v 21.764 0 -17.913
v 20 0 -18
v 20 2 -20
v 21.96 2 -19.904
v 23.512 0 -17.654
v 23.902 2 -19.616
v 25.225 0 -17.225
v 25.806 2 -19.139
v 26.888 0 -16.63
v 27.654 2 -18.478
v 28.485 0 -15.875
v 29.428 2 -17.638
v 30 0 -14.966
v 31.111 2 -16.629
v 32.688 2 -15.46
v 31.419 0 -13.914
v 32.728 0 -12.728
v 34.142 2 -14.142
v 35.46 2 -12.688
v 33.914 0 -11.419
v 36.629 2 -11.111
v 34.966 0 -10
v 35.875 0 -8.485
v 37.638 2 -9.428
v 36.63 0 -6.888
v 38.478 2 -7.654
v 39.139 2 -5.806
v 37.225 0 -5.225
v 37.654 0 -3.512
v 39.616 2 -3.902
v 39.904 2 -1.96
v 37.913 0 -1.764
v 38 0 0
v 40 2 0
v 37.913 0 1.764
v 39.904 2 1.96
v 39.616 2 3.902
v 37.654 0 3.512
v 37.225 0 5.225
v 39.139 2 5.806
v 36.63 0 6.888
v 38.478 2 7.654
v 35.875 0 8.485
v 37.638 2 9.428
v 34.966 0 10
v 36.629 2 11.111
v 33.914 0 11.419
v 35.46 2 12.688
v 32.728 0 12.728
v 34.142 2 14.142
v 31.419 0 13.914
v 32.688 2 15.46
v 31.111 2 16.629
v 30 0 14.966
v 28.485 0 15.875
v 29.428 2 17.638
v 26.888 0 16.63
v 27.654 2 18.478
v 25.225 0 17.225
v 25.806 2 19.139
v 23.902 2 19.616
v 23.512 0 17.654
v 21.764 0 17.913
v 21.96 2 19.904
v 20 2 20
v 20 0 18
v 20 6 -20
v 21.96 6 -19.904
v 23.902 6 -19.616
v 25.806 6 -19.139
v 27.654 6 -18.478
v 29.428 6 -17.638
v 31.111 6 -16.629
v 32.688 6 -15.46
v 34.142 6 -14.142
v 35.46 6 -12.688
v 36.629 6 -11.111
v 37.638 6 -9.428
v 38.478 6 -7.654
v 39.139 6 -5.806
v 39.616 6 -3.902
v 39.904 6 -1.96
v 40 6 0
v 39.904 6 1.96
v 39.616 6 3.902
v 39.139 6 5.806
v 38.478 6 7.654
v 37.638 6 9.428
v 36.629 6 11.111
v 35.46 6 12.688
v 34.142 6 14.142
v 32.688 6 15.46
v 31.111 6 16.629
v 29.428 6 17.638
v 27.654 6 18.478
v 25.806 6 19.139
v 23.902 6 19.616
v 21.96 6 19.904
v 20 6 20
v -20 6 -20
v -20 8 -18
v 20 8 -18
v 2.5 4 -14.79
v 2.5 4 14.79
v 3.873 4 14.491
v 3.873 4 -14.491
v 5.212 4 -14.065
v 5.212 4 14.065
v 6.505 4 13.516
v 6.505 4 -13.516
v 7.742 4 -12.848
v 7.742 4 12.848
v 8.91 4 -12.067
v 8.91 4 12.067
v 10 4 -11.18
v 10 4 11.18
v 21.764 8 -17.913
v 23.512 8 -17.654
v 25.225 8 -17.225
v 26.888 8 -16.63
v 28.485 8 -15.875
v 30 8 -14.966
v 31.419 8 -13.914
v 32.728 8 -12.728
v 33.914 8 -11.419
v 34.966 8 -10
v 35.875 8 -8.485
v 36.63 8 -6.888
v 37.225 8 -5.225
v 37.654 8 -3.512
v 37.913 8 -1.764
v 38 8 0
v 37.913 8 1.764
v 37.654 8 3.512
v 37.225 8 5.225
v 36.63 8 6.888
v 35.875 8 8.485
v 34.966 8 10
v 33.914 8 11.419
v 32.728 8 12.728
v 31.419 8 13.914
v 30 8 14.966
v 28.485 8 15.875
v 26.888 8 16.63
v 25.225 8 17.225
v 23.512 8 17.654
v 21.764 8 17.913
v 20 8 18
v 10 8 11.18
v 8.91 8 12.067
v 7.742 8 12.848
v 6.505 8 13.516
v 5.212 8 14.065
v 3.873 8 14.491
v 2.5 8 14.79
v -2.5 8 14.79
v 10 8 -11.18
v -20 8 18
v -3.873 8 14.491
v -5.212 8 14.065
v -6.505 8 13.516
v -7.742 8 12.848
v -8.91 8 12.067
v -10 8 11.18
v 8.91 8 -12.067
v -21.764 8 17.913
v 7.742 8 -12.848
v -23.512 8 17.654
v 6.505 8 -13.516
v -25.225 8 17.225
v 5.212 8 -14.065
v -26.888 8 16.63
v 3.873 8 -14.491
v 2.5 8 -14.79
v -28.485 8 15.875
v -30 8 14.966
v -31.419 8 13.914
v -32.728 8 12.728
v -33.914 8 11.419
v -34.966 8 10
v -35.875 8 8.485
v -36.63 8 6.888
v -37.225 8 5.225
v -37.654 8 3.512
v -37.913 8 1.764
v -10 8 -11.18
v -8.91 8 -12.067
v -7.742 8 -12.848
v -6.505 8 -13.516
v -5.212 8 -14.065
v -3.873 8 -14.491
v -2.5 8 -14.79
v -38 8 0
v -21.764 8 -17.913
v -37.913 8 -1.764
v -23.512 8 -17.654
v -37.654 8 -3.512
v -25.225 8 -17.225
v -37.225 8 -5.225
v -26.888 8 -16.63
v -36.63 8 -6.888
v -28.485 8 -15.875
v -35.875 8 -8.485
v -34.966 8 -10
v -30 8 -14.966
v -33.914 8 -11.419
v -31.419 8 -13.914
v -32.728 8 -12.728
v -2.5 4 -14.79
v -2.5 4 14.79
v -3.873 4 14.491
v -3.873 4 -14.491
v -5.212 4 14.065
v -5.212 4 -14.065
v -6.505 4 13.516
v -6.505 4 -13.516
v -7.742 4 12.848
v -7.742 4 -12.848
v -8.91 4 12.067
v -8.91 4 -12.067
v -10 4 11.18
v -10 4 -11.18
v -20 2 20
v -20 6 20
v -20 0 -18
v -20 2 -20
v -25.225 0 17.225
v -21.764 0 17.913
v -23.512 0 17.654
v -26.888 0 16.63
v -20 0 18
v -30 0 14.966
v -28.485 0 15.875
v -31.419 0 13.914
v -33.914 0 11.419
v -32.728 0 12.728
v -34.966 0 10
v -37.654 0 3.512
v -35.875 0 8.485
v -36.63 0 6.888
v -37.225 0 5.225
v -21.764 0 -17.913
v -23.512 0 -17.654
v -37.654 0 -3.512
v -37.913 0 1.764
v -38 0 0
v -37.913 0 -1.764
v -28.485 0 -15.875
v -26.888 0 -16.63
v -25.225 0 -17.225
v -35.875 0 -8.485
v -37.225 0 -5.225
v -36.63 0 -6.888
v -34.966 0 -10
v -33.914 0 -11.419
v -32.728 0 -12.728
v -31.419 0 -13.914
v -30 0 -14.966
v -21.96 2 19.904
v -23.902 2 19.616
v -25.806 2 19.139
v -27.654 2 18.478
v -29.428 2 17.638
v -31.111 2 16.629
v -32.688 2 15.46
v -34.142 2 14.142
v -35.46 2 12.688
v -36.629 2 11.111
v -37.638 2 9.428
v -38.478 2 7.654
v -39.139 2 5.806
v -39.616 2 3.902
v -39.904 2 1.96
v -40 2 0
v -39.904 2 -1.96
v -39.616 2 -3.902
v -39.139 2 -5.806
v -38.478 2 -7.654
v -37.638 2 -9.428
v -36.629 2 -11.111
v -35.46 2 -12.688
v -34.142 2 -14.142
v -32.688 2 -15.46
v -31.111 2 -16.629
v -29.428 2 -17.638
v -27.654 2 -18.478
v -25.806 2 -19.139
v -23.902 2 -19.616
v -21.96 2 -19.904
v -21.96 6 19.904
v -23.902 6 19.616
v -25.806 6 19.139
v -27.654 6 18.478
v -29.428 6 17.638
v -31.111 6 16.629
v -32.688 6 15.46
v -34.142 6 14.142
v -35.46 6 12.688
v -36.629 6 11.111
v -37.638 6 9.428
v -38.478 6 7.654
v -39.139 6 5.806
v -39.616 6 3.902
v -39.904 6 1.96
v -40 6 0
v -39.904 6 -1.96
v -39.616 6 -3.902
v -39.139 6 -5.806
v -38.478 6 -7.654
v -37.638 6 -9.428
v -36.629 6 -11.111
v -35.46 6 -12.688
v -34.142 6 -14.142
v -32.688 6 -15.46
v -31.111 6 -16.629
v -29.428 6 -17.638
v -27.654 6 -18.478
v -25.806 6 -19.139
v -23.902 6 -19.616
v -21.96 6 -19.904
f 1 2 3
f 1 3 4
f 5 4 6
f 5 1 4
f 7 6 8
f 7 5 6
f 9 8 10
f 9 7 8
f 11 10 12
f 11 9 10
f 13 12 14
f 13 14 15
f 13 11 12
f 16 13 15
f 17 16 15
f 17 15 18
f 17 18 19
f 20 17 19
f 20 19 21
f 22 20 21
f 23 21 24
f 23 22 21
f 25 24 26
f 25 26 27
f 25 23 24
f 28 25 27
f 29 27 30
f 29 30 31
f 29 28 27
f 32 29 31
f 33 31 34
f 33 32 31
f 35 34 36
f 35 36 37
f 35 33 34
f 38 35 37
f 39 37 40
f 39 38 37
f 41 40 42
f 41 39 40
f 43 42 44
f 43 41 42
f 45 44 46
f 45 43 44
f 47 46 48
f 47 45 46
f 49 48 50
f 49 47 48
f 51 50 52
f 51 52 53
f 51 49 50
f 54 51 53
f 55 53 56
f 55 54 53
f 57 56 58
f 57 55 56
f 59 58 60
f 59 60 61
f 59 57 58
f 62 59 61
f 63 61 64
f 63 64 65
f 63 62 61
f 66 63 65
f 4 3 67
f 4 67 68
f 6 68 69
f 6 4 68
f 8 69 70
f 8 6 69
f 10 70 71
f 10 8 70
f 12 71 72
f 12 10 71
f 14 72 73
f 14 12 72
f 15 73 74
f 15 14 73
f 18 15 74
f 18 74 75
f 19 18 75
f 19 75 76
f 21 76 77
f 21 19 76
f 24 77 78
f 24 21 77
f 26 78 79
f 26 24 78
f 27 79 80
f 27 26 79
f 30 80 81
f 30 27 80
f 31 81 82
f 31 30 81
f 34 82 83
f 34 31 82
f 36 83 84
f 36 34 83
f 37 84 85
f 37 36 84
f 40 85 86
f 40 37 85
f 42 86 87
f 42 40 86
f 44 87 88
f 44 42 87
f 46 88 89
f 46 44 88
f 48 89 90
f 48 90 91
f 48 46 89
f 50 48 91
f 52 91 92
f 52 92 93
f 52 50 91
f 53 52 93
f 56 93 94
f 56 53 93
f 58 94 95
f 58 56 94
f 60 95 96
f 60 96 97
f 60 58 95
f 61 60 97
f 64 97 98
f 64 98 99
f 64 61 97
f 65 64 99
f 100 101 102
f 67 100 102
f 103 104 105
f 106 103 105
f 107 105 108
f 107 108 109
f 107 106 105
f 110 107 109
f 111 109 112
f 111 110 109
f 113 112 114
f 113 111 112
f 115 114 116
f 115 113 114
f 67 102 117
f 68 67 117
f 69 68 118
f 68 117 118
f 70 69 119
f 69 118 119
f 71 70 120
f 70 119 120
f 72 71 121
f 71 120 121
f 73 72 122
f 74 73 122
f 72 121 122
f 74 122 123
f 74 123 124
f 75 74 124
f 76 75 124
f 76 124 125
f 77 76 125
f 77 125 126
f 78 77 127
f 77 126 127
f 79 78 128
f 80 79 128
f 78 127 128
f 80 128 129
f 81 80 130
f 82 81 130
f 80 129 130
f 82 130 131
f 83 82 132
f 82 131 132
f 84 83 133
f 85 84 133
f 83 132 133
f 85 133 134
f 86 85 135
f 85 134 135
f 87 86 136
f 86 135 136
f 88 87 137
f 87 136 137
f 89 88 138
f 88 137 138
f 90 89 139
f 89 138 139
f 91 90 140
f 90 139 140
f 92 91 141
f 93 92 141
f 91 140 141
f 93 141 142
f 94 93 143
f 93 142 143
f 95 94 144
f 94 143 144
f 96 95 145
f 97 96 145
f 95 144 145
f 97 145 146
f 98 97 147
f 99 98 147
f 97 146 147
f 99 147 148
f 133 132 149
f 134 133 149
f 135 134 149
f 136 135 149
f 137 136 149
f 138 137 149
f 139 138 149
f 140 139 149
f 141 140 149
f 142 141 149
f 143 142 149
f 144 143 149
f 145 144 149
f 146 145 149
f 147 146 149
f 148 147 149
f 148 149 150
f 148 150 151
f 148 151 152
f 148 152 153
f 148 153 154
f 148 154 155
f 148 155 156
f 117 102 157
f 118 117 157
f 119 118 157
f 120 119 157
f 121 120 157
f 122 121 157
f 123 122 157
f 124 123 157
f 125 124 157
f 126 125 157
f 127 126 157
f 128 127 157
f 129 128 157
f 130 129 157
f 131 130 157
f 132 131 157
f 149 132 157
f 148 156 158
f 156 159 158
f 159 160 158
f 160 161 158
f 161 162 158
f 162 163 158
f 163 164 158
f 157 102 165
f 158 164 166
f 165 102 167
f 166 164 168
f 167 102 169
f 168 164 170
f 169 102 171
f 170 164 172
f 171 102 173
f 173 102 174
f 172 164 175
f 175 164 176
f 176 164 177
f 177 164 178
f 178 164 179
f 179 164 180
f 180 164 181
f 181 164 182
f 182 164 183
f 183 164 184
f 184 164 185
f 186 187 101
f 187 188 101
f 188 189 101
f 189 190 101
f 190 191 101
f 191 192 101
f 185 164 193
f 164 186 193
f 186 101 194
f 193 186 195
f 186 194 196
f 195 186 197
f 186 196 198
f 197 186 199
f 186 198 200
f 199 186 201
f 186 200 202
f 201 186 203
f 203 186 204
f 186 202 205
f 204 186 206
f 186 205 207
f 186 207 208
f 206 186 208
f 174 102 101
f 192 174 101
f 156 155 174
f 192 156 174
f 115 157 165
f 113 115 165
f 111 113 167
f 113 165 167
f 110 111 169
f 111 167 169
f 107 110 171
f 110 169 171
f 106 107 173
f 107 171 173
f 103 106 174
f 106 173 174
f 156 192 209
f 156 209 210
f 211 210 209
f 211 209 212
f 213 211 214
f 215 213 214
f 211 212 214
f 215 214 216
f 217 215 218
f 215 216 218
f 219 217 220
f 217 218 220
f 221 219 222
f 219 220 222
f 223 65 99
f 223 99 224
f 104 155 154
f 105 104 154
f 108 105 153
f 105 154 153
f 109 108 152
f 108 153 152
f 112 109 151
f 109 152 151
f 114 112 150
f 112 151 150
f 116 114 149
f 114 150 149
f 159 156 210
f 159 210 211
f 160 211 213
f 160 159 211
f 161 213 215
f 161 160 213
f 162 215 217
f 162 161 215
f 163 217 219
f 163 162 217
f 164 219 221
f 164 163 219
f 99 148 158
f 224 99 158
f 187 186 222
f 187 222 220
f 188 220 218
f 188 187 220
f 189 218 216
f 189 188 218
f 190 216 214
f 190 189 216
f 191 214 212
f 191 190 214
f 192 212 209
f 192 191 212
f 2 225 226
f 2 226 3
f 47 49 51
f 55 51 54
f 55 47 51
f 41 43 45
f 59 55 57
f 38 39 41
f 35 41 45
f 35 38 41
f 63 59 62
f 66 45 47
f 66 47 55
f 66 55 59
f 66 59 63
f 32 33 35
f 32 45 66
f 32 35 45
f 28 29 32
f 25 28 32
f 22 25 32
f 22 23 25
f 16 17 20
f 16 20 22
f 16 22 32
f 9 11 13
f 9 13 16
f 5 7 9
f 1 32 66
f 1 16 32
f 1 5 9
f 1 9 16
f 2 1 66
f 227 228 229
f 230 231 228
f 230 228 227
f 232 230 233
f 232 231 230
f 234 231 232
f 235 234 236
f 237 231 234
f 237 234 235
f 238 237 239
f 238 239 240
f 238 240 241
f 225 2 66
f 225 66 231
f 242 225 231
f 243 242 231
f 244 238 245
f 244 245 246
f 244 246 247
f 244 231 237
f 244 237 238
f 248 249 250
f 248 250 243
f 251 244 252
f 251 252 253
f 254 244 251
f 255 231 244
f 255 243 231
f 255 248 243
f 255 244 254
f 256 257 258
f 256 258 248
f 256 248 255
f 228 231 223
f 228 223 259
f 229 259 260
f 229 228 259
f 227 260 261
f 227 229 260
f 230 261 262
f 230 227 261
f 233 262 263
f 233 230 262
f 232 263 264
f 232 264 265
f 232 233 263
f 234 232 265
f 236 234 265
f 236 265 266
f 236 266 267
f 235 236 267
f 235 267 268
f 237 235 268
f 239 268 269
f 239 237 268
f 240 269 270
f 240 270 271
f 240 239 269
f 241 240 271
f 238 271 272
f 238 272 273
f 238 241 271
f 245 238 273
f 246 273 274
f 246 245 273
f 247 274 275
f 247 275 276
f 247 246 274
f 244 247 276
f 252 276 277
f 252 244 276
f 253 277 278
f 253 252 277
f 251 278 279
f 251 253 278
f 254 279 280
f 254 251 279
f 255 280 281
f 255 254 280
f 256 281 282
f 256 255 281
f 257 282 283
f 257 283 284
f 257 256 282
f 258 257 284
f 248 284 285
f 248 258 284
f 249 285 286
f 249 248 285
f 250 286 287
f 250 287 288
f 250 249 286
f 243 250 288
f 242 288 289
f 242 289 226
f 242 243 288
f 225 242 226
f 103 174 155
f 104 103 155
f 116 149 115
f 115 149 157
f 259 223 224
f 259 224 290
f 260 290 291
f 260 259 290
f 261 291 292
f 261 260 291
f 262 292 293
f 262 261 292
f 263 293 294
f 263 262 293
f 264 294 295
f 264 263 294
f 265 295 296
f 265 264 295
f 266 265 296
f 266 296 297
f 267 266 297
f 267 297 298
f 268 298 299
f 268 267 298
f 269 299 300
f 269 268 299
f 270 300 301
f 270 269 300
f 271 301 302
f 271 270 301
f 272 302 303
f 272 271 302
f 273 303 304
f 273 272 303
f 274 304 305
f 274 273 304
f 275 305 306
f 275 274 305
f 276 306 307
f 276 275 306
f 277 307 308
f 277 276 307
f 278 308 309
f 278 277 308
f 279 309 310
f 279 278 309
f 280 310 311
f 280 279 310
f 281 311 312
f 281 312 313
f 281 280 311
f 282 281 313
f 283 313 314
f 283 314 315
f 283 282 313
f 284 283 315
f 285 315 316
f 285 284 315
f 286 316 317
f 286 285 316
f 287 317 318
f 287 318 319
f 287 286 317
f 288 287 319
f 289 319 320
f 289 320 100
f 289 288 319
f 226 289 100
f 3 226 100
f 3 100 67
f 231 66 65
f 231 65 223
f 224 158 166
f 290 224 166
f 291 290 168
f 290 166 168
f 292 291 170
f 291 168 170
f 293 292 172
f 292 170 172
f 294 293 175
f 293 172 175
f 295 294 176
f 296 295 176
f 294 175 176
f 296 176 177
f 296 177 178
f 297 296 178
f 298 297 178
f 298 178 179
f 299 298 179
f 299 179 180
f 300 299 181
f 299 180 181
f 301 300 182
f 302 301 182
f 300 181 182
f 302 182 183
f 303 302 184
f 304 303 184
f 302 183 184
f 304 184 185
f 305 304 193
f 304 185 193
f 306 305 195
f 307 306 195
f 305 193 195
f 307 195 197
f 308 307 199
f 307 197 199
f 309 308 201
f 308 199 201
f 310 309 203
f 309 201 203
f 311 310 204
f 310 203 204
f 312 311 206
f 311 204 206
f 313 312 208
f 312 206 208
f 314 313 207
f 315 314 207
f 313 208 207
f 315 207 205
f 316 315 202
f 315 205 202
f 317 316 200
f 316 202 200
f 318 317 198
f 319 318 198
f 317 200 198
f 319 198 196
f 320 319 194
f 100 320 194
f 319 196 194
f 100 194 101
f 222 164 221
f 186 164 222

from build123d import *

# Parameters (mm, degrees)
BOSS_EXTRUDE1_DEPTH = 8
CUT_EXTRUDE5_DEPTH  = 4
CHAMFER1_SIZE       = 2


with BuildPart() as part:
    # Sketch1 → Boss-Extrude1 (new body)
    with BuildSketch(Plane(origin=(0, 0, 0), x_dir=(1, 0, 0), z_dir=(0, 1, 0))):
        with BuildLine():
            Line((-20, 20), (20, 20))
            ThreePointArc((20, 20), (40, 0), (20, -20))
            Line((20, -20), (-20, -20))
            ThreePointArc((-20, -20), (-40, 0), (-20, 20))
        make_face()
    extrude(amount=BOSS_EXTRUDE1_DEPTH)

    # Sketch2 → Cut-Extrude5 (cut)
    with BuildSketch(Plane(origin=(0, 8, 0), x_dir=(1, 0, 0), z_dir=(0, 1, 0))):
        with BuildLine():
            Line((-10, -11.180339887), (-10, 11.180339887))
            ThreePointArc((-10, 11.180339887), (-6.505403256, 13.515906498), (-2.5, 14.790199458))
            Line((-2.5, 14.790199458), (-2.5, -14.790199458))
            ThreePointArc((-2.5, -14.790199458), (-6.505403256, -13.515906498), (-10, -11.180339887))
        make_face()
        with BuildLine():
            Line((10, -11.180339887), (10, 11.180339887))
            ThreePointArc((10, 11.180339887), (6.505403256, 13.515906498), (2.5, 14.790199458))
            Line((2.5, 14.790199458), (2.5, -14.790199458))
            ThreePointArc((2.5, -14.790199458), (6.505403256, -13.515906498), (10, -11.180339887))
        make_face()
    extrude(amount=-CUT_EXTRUDE5_DEPTH, mode=Mode.SUBTRACT)

    # Chamfer1
    chamfer1_edges = [part.edges().sort_by_distance(p)[0] for p in [
        (40, 8, 0),
        (0, 8, -20),
        (-40, 8, 0),
        (0, 0, -20),
        (40, 0, 0),
        (0, 0, 20),
        (-40, 0, 0),
        (0, 8, 20),
    ]]
    chamfer(chamfer1_edges, length=CHAMFER1_SIZE)


solid = part.part
